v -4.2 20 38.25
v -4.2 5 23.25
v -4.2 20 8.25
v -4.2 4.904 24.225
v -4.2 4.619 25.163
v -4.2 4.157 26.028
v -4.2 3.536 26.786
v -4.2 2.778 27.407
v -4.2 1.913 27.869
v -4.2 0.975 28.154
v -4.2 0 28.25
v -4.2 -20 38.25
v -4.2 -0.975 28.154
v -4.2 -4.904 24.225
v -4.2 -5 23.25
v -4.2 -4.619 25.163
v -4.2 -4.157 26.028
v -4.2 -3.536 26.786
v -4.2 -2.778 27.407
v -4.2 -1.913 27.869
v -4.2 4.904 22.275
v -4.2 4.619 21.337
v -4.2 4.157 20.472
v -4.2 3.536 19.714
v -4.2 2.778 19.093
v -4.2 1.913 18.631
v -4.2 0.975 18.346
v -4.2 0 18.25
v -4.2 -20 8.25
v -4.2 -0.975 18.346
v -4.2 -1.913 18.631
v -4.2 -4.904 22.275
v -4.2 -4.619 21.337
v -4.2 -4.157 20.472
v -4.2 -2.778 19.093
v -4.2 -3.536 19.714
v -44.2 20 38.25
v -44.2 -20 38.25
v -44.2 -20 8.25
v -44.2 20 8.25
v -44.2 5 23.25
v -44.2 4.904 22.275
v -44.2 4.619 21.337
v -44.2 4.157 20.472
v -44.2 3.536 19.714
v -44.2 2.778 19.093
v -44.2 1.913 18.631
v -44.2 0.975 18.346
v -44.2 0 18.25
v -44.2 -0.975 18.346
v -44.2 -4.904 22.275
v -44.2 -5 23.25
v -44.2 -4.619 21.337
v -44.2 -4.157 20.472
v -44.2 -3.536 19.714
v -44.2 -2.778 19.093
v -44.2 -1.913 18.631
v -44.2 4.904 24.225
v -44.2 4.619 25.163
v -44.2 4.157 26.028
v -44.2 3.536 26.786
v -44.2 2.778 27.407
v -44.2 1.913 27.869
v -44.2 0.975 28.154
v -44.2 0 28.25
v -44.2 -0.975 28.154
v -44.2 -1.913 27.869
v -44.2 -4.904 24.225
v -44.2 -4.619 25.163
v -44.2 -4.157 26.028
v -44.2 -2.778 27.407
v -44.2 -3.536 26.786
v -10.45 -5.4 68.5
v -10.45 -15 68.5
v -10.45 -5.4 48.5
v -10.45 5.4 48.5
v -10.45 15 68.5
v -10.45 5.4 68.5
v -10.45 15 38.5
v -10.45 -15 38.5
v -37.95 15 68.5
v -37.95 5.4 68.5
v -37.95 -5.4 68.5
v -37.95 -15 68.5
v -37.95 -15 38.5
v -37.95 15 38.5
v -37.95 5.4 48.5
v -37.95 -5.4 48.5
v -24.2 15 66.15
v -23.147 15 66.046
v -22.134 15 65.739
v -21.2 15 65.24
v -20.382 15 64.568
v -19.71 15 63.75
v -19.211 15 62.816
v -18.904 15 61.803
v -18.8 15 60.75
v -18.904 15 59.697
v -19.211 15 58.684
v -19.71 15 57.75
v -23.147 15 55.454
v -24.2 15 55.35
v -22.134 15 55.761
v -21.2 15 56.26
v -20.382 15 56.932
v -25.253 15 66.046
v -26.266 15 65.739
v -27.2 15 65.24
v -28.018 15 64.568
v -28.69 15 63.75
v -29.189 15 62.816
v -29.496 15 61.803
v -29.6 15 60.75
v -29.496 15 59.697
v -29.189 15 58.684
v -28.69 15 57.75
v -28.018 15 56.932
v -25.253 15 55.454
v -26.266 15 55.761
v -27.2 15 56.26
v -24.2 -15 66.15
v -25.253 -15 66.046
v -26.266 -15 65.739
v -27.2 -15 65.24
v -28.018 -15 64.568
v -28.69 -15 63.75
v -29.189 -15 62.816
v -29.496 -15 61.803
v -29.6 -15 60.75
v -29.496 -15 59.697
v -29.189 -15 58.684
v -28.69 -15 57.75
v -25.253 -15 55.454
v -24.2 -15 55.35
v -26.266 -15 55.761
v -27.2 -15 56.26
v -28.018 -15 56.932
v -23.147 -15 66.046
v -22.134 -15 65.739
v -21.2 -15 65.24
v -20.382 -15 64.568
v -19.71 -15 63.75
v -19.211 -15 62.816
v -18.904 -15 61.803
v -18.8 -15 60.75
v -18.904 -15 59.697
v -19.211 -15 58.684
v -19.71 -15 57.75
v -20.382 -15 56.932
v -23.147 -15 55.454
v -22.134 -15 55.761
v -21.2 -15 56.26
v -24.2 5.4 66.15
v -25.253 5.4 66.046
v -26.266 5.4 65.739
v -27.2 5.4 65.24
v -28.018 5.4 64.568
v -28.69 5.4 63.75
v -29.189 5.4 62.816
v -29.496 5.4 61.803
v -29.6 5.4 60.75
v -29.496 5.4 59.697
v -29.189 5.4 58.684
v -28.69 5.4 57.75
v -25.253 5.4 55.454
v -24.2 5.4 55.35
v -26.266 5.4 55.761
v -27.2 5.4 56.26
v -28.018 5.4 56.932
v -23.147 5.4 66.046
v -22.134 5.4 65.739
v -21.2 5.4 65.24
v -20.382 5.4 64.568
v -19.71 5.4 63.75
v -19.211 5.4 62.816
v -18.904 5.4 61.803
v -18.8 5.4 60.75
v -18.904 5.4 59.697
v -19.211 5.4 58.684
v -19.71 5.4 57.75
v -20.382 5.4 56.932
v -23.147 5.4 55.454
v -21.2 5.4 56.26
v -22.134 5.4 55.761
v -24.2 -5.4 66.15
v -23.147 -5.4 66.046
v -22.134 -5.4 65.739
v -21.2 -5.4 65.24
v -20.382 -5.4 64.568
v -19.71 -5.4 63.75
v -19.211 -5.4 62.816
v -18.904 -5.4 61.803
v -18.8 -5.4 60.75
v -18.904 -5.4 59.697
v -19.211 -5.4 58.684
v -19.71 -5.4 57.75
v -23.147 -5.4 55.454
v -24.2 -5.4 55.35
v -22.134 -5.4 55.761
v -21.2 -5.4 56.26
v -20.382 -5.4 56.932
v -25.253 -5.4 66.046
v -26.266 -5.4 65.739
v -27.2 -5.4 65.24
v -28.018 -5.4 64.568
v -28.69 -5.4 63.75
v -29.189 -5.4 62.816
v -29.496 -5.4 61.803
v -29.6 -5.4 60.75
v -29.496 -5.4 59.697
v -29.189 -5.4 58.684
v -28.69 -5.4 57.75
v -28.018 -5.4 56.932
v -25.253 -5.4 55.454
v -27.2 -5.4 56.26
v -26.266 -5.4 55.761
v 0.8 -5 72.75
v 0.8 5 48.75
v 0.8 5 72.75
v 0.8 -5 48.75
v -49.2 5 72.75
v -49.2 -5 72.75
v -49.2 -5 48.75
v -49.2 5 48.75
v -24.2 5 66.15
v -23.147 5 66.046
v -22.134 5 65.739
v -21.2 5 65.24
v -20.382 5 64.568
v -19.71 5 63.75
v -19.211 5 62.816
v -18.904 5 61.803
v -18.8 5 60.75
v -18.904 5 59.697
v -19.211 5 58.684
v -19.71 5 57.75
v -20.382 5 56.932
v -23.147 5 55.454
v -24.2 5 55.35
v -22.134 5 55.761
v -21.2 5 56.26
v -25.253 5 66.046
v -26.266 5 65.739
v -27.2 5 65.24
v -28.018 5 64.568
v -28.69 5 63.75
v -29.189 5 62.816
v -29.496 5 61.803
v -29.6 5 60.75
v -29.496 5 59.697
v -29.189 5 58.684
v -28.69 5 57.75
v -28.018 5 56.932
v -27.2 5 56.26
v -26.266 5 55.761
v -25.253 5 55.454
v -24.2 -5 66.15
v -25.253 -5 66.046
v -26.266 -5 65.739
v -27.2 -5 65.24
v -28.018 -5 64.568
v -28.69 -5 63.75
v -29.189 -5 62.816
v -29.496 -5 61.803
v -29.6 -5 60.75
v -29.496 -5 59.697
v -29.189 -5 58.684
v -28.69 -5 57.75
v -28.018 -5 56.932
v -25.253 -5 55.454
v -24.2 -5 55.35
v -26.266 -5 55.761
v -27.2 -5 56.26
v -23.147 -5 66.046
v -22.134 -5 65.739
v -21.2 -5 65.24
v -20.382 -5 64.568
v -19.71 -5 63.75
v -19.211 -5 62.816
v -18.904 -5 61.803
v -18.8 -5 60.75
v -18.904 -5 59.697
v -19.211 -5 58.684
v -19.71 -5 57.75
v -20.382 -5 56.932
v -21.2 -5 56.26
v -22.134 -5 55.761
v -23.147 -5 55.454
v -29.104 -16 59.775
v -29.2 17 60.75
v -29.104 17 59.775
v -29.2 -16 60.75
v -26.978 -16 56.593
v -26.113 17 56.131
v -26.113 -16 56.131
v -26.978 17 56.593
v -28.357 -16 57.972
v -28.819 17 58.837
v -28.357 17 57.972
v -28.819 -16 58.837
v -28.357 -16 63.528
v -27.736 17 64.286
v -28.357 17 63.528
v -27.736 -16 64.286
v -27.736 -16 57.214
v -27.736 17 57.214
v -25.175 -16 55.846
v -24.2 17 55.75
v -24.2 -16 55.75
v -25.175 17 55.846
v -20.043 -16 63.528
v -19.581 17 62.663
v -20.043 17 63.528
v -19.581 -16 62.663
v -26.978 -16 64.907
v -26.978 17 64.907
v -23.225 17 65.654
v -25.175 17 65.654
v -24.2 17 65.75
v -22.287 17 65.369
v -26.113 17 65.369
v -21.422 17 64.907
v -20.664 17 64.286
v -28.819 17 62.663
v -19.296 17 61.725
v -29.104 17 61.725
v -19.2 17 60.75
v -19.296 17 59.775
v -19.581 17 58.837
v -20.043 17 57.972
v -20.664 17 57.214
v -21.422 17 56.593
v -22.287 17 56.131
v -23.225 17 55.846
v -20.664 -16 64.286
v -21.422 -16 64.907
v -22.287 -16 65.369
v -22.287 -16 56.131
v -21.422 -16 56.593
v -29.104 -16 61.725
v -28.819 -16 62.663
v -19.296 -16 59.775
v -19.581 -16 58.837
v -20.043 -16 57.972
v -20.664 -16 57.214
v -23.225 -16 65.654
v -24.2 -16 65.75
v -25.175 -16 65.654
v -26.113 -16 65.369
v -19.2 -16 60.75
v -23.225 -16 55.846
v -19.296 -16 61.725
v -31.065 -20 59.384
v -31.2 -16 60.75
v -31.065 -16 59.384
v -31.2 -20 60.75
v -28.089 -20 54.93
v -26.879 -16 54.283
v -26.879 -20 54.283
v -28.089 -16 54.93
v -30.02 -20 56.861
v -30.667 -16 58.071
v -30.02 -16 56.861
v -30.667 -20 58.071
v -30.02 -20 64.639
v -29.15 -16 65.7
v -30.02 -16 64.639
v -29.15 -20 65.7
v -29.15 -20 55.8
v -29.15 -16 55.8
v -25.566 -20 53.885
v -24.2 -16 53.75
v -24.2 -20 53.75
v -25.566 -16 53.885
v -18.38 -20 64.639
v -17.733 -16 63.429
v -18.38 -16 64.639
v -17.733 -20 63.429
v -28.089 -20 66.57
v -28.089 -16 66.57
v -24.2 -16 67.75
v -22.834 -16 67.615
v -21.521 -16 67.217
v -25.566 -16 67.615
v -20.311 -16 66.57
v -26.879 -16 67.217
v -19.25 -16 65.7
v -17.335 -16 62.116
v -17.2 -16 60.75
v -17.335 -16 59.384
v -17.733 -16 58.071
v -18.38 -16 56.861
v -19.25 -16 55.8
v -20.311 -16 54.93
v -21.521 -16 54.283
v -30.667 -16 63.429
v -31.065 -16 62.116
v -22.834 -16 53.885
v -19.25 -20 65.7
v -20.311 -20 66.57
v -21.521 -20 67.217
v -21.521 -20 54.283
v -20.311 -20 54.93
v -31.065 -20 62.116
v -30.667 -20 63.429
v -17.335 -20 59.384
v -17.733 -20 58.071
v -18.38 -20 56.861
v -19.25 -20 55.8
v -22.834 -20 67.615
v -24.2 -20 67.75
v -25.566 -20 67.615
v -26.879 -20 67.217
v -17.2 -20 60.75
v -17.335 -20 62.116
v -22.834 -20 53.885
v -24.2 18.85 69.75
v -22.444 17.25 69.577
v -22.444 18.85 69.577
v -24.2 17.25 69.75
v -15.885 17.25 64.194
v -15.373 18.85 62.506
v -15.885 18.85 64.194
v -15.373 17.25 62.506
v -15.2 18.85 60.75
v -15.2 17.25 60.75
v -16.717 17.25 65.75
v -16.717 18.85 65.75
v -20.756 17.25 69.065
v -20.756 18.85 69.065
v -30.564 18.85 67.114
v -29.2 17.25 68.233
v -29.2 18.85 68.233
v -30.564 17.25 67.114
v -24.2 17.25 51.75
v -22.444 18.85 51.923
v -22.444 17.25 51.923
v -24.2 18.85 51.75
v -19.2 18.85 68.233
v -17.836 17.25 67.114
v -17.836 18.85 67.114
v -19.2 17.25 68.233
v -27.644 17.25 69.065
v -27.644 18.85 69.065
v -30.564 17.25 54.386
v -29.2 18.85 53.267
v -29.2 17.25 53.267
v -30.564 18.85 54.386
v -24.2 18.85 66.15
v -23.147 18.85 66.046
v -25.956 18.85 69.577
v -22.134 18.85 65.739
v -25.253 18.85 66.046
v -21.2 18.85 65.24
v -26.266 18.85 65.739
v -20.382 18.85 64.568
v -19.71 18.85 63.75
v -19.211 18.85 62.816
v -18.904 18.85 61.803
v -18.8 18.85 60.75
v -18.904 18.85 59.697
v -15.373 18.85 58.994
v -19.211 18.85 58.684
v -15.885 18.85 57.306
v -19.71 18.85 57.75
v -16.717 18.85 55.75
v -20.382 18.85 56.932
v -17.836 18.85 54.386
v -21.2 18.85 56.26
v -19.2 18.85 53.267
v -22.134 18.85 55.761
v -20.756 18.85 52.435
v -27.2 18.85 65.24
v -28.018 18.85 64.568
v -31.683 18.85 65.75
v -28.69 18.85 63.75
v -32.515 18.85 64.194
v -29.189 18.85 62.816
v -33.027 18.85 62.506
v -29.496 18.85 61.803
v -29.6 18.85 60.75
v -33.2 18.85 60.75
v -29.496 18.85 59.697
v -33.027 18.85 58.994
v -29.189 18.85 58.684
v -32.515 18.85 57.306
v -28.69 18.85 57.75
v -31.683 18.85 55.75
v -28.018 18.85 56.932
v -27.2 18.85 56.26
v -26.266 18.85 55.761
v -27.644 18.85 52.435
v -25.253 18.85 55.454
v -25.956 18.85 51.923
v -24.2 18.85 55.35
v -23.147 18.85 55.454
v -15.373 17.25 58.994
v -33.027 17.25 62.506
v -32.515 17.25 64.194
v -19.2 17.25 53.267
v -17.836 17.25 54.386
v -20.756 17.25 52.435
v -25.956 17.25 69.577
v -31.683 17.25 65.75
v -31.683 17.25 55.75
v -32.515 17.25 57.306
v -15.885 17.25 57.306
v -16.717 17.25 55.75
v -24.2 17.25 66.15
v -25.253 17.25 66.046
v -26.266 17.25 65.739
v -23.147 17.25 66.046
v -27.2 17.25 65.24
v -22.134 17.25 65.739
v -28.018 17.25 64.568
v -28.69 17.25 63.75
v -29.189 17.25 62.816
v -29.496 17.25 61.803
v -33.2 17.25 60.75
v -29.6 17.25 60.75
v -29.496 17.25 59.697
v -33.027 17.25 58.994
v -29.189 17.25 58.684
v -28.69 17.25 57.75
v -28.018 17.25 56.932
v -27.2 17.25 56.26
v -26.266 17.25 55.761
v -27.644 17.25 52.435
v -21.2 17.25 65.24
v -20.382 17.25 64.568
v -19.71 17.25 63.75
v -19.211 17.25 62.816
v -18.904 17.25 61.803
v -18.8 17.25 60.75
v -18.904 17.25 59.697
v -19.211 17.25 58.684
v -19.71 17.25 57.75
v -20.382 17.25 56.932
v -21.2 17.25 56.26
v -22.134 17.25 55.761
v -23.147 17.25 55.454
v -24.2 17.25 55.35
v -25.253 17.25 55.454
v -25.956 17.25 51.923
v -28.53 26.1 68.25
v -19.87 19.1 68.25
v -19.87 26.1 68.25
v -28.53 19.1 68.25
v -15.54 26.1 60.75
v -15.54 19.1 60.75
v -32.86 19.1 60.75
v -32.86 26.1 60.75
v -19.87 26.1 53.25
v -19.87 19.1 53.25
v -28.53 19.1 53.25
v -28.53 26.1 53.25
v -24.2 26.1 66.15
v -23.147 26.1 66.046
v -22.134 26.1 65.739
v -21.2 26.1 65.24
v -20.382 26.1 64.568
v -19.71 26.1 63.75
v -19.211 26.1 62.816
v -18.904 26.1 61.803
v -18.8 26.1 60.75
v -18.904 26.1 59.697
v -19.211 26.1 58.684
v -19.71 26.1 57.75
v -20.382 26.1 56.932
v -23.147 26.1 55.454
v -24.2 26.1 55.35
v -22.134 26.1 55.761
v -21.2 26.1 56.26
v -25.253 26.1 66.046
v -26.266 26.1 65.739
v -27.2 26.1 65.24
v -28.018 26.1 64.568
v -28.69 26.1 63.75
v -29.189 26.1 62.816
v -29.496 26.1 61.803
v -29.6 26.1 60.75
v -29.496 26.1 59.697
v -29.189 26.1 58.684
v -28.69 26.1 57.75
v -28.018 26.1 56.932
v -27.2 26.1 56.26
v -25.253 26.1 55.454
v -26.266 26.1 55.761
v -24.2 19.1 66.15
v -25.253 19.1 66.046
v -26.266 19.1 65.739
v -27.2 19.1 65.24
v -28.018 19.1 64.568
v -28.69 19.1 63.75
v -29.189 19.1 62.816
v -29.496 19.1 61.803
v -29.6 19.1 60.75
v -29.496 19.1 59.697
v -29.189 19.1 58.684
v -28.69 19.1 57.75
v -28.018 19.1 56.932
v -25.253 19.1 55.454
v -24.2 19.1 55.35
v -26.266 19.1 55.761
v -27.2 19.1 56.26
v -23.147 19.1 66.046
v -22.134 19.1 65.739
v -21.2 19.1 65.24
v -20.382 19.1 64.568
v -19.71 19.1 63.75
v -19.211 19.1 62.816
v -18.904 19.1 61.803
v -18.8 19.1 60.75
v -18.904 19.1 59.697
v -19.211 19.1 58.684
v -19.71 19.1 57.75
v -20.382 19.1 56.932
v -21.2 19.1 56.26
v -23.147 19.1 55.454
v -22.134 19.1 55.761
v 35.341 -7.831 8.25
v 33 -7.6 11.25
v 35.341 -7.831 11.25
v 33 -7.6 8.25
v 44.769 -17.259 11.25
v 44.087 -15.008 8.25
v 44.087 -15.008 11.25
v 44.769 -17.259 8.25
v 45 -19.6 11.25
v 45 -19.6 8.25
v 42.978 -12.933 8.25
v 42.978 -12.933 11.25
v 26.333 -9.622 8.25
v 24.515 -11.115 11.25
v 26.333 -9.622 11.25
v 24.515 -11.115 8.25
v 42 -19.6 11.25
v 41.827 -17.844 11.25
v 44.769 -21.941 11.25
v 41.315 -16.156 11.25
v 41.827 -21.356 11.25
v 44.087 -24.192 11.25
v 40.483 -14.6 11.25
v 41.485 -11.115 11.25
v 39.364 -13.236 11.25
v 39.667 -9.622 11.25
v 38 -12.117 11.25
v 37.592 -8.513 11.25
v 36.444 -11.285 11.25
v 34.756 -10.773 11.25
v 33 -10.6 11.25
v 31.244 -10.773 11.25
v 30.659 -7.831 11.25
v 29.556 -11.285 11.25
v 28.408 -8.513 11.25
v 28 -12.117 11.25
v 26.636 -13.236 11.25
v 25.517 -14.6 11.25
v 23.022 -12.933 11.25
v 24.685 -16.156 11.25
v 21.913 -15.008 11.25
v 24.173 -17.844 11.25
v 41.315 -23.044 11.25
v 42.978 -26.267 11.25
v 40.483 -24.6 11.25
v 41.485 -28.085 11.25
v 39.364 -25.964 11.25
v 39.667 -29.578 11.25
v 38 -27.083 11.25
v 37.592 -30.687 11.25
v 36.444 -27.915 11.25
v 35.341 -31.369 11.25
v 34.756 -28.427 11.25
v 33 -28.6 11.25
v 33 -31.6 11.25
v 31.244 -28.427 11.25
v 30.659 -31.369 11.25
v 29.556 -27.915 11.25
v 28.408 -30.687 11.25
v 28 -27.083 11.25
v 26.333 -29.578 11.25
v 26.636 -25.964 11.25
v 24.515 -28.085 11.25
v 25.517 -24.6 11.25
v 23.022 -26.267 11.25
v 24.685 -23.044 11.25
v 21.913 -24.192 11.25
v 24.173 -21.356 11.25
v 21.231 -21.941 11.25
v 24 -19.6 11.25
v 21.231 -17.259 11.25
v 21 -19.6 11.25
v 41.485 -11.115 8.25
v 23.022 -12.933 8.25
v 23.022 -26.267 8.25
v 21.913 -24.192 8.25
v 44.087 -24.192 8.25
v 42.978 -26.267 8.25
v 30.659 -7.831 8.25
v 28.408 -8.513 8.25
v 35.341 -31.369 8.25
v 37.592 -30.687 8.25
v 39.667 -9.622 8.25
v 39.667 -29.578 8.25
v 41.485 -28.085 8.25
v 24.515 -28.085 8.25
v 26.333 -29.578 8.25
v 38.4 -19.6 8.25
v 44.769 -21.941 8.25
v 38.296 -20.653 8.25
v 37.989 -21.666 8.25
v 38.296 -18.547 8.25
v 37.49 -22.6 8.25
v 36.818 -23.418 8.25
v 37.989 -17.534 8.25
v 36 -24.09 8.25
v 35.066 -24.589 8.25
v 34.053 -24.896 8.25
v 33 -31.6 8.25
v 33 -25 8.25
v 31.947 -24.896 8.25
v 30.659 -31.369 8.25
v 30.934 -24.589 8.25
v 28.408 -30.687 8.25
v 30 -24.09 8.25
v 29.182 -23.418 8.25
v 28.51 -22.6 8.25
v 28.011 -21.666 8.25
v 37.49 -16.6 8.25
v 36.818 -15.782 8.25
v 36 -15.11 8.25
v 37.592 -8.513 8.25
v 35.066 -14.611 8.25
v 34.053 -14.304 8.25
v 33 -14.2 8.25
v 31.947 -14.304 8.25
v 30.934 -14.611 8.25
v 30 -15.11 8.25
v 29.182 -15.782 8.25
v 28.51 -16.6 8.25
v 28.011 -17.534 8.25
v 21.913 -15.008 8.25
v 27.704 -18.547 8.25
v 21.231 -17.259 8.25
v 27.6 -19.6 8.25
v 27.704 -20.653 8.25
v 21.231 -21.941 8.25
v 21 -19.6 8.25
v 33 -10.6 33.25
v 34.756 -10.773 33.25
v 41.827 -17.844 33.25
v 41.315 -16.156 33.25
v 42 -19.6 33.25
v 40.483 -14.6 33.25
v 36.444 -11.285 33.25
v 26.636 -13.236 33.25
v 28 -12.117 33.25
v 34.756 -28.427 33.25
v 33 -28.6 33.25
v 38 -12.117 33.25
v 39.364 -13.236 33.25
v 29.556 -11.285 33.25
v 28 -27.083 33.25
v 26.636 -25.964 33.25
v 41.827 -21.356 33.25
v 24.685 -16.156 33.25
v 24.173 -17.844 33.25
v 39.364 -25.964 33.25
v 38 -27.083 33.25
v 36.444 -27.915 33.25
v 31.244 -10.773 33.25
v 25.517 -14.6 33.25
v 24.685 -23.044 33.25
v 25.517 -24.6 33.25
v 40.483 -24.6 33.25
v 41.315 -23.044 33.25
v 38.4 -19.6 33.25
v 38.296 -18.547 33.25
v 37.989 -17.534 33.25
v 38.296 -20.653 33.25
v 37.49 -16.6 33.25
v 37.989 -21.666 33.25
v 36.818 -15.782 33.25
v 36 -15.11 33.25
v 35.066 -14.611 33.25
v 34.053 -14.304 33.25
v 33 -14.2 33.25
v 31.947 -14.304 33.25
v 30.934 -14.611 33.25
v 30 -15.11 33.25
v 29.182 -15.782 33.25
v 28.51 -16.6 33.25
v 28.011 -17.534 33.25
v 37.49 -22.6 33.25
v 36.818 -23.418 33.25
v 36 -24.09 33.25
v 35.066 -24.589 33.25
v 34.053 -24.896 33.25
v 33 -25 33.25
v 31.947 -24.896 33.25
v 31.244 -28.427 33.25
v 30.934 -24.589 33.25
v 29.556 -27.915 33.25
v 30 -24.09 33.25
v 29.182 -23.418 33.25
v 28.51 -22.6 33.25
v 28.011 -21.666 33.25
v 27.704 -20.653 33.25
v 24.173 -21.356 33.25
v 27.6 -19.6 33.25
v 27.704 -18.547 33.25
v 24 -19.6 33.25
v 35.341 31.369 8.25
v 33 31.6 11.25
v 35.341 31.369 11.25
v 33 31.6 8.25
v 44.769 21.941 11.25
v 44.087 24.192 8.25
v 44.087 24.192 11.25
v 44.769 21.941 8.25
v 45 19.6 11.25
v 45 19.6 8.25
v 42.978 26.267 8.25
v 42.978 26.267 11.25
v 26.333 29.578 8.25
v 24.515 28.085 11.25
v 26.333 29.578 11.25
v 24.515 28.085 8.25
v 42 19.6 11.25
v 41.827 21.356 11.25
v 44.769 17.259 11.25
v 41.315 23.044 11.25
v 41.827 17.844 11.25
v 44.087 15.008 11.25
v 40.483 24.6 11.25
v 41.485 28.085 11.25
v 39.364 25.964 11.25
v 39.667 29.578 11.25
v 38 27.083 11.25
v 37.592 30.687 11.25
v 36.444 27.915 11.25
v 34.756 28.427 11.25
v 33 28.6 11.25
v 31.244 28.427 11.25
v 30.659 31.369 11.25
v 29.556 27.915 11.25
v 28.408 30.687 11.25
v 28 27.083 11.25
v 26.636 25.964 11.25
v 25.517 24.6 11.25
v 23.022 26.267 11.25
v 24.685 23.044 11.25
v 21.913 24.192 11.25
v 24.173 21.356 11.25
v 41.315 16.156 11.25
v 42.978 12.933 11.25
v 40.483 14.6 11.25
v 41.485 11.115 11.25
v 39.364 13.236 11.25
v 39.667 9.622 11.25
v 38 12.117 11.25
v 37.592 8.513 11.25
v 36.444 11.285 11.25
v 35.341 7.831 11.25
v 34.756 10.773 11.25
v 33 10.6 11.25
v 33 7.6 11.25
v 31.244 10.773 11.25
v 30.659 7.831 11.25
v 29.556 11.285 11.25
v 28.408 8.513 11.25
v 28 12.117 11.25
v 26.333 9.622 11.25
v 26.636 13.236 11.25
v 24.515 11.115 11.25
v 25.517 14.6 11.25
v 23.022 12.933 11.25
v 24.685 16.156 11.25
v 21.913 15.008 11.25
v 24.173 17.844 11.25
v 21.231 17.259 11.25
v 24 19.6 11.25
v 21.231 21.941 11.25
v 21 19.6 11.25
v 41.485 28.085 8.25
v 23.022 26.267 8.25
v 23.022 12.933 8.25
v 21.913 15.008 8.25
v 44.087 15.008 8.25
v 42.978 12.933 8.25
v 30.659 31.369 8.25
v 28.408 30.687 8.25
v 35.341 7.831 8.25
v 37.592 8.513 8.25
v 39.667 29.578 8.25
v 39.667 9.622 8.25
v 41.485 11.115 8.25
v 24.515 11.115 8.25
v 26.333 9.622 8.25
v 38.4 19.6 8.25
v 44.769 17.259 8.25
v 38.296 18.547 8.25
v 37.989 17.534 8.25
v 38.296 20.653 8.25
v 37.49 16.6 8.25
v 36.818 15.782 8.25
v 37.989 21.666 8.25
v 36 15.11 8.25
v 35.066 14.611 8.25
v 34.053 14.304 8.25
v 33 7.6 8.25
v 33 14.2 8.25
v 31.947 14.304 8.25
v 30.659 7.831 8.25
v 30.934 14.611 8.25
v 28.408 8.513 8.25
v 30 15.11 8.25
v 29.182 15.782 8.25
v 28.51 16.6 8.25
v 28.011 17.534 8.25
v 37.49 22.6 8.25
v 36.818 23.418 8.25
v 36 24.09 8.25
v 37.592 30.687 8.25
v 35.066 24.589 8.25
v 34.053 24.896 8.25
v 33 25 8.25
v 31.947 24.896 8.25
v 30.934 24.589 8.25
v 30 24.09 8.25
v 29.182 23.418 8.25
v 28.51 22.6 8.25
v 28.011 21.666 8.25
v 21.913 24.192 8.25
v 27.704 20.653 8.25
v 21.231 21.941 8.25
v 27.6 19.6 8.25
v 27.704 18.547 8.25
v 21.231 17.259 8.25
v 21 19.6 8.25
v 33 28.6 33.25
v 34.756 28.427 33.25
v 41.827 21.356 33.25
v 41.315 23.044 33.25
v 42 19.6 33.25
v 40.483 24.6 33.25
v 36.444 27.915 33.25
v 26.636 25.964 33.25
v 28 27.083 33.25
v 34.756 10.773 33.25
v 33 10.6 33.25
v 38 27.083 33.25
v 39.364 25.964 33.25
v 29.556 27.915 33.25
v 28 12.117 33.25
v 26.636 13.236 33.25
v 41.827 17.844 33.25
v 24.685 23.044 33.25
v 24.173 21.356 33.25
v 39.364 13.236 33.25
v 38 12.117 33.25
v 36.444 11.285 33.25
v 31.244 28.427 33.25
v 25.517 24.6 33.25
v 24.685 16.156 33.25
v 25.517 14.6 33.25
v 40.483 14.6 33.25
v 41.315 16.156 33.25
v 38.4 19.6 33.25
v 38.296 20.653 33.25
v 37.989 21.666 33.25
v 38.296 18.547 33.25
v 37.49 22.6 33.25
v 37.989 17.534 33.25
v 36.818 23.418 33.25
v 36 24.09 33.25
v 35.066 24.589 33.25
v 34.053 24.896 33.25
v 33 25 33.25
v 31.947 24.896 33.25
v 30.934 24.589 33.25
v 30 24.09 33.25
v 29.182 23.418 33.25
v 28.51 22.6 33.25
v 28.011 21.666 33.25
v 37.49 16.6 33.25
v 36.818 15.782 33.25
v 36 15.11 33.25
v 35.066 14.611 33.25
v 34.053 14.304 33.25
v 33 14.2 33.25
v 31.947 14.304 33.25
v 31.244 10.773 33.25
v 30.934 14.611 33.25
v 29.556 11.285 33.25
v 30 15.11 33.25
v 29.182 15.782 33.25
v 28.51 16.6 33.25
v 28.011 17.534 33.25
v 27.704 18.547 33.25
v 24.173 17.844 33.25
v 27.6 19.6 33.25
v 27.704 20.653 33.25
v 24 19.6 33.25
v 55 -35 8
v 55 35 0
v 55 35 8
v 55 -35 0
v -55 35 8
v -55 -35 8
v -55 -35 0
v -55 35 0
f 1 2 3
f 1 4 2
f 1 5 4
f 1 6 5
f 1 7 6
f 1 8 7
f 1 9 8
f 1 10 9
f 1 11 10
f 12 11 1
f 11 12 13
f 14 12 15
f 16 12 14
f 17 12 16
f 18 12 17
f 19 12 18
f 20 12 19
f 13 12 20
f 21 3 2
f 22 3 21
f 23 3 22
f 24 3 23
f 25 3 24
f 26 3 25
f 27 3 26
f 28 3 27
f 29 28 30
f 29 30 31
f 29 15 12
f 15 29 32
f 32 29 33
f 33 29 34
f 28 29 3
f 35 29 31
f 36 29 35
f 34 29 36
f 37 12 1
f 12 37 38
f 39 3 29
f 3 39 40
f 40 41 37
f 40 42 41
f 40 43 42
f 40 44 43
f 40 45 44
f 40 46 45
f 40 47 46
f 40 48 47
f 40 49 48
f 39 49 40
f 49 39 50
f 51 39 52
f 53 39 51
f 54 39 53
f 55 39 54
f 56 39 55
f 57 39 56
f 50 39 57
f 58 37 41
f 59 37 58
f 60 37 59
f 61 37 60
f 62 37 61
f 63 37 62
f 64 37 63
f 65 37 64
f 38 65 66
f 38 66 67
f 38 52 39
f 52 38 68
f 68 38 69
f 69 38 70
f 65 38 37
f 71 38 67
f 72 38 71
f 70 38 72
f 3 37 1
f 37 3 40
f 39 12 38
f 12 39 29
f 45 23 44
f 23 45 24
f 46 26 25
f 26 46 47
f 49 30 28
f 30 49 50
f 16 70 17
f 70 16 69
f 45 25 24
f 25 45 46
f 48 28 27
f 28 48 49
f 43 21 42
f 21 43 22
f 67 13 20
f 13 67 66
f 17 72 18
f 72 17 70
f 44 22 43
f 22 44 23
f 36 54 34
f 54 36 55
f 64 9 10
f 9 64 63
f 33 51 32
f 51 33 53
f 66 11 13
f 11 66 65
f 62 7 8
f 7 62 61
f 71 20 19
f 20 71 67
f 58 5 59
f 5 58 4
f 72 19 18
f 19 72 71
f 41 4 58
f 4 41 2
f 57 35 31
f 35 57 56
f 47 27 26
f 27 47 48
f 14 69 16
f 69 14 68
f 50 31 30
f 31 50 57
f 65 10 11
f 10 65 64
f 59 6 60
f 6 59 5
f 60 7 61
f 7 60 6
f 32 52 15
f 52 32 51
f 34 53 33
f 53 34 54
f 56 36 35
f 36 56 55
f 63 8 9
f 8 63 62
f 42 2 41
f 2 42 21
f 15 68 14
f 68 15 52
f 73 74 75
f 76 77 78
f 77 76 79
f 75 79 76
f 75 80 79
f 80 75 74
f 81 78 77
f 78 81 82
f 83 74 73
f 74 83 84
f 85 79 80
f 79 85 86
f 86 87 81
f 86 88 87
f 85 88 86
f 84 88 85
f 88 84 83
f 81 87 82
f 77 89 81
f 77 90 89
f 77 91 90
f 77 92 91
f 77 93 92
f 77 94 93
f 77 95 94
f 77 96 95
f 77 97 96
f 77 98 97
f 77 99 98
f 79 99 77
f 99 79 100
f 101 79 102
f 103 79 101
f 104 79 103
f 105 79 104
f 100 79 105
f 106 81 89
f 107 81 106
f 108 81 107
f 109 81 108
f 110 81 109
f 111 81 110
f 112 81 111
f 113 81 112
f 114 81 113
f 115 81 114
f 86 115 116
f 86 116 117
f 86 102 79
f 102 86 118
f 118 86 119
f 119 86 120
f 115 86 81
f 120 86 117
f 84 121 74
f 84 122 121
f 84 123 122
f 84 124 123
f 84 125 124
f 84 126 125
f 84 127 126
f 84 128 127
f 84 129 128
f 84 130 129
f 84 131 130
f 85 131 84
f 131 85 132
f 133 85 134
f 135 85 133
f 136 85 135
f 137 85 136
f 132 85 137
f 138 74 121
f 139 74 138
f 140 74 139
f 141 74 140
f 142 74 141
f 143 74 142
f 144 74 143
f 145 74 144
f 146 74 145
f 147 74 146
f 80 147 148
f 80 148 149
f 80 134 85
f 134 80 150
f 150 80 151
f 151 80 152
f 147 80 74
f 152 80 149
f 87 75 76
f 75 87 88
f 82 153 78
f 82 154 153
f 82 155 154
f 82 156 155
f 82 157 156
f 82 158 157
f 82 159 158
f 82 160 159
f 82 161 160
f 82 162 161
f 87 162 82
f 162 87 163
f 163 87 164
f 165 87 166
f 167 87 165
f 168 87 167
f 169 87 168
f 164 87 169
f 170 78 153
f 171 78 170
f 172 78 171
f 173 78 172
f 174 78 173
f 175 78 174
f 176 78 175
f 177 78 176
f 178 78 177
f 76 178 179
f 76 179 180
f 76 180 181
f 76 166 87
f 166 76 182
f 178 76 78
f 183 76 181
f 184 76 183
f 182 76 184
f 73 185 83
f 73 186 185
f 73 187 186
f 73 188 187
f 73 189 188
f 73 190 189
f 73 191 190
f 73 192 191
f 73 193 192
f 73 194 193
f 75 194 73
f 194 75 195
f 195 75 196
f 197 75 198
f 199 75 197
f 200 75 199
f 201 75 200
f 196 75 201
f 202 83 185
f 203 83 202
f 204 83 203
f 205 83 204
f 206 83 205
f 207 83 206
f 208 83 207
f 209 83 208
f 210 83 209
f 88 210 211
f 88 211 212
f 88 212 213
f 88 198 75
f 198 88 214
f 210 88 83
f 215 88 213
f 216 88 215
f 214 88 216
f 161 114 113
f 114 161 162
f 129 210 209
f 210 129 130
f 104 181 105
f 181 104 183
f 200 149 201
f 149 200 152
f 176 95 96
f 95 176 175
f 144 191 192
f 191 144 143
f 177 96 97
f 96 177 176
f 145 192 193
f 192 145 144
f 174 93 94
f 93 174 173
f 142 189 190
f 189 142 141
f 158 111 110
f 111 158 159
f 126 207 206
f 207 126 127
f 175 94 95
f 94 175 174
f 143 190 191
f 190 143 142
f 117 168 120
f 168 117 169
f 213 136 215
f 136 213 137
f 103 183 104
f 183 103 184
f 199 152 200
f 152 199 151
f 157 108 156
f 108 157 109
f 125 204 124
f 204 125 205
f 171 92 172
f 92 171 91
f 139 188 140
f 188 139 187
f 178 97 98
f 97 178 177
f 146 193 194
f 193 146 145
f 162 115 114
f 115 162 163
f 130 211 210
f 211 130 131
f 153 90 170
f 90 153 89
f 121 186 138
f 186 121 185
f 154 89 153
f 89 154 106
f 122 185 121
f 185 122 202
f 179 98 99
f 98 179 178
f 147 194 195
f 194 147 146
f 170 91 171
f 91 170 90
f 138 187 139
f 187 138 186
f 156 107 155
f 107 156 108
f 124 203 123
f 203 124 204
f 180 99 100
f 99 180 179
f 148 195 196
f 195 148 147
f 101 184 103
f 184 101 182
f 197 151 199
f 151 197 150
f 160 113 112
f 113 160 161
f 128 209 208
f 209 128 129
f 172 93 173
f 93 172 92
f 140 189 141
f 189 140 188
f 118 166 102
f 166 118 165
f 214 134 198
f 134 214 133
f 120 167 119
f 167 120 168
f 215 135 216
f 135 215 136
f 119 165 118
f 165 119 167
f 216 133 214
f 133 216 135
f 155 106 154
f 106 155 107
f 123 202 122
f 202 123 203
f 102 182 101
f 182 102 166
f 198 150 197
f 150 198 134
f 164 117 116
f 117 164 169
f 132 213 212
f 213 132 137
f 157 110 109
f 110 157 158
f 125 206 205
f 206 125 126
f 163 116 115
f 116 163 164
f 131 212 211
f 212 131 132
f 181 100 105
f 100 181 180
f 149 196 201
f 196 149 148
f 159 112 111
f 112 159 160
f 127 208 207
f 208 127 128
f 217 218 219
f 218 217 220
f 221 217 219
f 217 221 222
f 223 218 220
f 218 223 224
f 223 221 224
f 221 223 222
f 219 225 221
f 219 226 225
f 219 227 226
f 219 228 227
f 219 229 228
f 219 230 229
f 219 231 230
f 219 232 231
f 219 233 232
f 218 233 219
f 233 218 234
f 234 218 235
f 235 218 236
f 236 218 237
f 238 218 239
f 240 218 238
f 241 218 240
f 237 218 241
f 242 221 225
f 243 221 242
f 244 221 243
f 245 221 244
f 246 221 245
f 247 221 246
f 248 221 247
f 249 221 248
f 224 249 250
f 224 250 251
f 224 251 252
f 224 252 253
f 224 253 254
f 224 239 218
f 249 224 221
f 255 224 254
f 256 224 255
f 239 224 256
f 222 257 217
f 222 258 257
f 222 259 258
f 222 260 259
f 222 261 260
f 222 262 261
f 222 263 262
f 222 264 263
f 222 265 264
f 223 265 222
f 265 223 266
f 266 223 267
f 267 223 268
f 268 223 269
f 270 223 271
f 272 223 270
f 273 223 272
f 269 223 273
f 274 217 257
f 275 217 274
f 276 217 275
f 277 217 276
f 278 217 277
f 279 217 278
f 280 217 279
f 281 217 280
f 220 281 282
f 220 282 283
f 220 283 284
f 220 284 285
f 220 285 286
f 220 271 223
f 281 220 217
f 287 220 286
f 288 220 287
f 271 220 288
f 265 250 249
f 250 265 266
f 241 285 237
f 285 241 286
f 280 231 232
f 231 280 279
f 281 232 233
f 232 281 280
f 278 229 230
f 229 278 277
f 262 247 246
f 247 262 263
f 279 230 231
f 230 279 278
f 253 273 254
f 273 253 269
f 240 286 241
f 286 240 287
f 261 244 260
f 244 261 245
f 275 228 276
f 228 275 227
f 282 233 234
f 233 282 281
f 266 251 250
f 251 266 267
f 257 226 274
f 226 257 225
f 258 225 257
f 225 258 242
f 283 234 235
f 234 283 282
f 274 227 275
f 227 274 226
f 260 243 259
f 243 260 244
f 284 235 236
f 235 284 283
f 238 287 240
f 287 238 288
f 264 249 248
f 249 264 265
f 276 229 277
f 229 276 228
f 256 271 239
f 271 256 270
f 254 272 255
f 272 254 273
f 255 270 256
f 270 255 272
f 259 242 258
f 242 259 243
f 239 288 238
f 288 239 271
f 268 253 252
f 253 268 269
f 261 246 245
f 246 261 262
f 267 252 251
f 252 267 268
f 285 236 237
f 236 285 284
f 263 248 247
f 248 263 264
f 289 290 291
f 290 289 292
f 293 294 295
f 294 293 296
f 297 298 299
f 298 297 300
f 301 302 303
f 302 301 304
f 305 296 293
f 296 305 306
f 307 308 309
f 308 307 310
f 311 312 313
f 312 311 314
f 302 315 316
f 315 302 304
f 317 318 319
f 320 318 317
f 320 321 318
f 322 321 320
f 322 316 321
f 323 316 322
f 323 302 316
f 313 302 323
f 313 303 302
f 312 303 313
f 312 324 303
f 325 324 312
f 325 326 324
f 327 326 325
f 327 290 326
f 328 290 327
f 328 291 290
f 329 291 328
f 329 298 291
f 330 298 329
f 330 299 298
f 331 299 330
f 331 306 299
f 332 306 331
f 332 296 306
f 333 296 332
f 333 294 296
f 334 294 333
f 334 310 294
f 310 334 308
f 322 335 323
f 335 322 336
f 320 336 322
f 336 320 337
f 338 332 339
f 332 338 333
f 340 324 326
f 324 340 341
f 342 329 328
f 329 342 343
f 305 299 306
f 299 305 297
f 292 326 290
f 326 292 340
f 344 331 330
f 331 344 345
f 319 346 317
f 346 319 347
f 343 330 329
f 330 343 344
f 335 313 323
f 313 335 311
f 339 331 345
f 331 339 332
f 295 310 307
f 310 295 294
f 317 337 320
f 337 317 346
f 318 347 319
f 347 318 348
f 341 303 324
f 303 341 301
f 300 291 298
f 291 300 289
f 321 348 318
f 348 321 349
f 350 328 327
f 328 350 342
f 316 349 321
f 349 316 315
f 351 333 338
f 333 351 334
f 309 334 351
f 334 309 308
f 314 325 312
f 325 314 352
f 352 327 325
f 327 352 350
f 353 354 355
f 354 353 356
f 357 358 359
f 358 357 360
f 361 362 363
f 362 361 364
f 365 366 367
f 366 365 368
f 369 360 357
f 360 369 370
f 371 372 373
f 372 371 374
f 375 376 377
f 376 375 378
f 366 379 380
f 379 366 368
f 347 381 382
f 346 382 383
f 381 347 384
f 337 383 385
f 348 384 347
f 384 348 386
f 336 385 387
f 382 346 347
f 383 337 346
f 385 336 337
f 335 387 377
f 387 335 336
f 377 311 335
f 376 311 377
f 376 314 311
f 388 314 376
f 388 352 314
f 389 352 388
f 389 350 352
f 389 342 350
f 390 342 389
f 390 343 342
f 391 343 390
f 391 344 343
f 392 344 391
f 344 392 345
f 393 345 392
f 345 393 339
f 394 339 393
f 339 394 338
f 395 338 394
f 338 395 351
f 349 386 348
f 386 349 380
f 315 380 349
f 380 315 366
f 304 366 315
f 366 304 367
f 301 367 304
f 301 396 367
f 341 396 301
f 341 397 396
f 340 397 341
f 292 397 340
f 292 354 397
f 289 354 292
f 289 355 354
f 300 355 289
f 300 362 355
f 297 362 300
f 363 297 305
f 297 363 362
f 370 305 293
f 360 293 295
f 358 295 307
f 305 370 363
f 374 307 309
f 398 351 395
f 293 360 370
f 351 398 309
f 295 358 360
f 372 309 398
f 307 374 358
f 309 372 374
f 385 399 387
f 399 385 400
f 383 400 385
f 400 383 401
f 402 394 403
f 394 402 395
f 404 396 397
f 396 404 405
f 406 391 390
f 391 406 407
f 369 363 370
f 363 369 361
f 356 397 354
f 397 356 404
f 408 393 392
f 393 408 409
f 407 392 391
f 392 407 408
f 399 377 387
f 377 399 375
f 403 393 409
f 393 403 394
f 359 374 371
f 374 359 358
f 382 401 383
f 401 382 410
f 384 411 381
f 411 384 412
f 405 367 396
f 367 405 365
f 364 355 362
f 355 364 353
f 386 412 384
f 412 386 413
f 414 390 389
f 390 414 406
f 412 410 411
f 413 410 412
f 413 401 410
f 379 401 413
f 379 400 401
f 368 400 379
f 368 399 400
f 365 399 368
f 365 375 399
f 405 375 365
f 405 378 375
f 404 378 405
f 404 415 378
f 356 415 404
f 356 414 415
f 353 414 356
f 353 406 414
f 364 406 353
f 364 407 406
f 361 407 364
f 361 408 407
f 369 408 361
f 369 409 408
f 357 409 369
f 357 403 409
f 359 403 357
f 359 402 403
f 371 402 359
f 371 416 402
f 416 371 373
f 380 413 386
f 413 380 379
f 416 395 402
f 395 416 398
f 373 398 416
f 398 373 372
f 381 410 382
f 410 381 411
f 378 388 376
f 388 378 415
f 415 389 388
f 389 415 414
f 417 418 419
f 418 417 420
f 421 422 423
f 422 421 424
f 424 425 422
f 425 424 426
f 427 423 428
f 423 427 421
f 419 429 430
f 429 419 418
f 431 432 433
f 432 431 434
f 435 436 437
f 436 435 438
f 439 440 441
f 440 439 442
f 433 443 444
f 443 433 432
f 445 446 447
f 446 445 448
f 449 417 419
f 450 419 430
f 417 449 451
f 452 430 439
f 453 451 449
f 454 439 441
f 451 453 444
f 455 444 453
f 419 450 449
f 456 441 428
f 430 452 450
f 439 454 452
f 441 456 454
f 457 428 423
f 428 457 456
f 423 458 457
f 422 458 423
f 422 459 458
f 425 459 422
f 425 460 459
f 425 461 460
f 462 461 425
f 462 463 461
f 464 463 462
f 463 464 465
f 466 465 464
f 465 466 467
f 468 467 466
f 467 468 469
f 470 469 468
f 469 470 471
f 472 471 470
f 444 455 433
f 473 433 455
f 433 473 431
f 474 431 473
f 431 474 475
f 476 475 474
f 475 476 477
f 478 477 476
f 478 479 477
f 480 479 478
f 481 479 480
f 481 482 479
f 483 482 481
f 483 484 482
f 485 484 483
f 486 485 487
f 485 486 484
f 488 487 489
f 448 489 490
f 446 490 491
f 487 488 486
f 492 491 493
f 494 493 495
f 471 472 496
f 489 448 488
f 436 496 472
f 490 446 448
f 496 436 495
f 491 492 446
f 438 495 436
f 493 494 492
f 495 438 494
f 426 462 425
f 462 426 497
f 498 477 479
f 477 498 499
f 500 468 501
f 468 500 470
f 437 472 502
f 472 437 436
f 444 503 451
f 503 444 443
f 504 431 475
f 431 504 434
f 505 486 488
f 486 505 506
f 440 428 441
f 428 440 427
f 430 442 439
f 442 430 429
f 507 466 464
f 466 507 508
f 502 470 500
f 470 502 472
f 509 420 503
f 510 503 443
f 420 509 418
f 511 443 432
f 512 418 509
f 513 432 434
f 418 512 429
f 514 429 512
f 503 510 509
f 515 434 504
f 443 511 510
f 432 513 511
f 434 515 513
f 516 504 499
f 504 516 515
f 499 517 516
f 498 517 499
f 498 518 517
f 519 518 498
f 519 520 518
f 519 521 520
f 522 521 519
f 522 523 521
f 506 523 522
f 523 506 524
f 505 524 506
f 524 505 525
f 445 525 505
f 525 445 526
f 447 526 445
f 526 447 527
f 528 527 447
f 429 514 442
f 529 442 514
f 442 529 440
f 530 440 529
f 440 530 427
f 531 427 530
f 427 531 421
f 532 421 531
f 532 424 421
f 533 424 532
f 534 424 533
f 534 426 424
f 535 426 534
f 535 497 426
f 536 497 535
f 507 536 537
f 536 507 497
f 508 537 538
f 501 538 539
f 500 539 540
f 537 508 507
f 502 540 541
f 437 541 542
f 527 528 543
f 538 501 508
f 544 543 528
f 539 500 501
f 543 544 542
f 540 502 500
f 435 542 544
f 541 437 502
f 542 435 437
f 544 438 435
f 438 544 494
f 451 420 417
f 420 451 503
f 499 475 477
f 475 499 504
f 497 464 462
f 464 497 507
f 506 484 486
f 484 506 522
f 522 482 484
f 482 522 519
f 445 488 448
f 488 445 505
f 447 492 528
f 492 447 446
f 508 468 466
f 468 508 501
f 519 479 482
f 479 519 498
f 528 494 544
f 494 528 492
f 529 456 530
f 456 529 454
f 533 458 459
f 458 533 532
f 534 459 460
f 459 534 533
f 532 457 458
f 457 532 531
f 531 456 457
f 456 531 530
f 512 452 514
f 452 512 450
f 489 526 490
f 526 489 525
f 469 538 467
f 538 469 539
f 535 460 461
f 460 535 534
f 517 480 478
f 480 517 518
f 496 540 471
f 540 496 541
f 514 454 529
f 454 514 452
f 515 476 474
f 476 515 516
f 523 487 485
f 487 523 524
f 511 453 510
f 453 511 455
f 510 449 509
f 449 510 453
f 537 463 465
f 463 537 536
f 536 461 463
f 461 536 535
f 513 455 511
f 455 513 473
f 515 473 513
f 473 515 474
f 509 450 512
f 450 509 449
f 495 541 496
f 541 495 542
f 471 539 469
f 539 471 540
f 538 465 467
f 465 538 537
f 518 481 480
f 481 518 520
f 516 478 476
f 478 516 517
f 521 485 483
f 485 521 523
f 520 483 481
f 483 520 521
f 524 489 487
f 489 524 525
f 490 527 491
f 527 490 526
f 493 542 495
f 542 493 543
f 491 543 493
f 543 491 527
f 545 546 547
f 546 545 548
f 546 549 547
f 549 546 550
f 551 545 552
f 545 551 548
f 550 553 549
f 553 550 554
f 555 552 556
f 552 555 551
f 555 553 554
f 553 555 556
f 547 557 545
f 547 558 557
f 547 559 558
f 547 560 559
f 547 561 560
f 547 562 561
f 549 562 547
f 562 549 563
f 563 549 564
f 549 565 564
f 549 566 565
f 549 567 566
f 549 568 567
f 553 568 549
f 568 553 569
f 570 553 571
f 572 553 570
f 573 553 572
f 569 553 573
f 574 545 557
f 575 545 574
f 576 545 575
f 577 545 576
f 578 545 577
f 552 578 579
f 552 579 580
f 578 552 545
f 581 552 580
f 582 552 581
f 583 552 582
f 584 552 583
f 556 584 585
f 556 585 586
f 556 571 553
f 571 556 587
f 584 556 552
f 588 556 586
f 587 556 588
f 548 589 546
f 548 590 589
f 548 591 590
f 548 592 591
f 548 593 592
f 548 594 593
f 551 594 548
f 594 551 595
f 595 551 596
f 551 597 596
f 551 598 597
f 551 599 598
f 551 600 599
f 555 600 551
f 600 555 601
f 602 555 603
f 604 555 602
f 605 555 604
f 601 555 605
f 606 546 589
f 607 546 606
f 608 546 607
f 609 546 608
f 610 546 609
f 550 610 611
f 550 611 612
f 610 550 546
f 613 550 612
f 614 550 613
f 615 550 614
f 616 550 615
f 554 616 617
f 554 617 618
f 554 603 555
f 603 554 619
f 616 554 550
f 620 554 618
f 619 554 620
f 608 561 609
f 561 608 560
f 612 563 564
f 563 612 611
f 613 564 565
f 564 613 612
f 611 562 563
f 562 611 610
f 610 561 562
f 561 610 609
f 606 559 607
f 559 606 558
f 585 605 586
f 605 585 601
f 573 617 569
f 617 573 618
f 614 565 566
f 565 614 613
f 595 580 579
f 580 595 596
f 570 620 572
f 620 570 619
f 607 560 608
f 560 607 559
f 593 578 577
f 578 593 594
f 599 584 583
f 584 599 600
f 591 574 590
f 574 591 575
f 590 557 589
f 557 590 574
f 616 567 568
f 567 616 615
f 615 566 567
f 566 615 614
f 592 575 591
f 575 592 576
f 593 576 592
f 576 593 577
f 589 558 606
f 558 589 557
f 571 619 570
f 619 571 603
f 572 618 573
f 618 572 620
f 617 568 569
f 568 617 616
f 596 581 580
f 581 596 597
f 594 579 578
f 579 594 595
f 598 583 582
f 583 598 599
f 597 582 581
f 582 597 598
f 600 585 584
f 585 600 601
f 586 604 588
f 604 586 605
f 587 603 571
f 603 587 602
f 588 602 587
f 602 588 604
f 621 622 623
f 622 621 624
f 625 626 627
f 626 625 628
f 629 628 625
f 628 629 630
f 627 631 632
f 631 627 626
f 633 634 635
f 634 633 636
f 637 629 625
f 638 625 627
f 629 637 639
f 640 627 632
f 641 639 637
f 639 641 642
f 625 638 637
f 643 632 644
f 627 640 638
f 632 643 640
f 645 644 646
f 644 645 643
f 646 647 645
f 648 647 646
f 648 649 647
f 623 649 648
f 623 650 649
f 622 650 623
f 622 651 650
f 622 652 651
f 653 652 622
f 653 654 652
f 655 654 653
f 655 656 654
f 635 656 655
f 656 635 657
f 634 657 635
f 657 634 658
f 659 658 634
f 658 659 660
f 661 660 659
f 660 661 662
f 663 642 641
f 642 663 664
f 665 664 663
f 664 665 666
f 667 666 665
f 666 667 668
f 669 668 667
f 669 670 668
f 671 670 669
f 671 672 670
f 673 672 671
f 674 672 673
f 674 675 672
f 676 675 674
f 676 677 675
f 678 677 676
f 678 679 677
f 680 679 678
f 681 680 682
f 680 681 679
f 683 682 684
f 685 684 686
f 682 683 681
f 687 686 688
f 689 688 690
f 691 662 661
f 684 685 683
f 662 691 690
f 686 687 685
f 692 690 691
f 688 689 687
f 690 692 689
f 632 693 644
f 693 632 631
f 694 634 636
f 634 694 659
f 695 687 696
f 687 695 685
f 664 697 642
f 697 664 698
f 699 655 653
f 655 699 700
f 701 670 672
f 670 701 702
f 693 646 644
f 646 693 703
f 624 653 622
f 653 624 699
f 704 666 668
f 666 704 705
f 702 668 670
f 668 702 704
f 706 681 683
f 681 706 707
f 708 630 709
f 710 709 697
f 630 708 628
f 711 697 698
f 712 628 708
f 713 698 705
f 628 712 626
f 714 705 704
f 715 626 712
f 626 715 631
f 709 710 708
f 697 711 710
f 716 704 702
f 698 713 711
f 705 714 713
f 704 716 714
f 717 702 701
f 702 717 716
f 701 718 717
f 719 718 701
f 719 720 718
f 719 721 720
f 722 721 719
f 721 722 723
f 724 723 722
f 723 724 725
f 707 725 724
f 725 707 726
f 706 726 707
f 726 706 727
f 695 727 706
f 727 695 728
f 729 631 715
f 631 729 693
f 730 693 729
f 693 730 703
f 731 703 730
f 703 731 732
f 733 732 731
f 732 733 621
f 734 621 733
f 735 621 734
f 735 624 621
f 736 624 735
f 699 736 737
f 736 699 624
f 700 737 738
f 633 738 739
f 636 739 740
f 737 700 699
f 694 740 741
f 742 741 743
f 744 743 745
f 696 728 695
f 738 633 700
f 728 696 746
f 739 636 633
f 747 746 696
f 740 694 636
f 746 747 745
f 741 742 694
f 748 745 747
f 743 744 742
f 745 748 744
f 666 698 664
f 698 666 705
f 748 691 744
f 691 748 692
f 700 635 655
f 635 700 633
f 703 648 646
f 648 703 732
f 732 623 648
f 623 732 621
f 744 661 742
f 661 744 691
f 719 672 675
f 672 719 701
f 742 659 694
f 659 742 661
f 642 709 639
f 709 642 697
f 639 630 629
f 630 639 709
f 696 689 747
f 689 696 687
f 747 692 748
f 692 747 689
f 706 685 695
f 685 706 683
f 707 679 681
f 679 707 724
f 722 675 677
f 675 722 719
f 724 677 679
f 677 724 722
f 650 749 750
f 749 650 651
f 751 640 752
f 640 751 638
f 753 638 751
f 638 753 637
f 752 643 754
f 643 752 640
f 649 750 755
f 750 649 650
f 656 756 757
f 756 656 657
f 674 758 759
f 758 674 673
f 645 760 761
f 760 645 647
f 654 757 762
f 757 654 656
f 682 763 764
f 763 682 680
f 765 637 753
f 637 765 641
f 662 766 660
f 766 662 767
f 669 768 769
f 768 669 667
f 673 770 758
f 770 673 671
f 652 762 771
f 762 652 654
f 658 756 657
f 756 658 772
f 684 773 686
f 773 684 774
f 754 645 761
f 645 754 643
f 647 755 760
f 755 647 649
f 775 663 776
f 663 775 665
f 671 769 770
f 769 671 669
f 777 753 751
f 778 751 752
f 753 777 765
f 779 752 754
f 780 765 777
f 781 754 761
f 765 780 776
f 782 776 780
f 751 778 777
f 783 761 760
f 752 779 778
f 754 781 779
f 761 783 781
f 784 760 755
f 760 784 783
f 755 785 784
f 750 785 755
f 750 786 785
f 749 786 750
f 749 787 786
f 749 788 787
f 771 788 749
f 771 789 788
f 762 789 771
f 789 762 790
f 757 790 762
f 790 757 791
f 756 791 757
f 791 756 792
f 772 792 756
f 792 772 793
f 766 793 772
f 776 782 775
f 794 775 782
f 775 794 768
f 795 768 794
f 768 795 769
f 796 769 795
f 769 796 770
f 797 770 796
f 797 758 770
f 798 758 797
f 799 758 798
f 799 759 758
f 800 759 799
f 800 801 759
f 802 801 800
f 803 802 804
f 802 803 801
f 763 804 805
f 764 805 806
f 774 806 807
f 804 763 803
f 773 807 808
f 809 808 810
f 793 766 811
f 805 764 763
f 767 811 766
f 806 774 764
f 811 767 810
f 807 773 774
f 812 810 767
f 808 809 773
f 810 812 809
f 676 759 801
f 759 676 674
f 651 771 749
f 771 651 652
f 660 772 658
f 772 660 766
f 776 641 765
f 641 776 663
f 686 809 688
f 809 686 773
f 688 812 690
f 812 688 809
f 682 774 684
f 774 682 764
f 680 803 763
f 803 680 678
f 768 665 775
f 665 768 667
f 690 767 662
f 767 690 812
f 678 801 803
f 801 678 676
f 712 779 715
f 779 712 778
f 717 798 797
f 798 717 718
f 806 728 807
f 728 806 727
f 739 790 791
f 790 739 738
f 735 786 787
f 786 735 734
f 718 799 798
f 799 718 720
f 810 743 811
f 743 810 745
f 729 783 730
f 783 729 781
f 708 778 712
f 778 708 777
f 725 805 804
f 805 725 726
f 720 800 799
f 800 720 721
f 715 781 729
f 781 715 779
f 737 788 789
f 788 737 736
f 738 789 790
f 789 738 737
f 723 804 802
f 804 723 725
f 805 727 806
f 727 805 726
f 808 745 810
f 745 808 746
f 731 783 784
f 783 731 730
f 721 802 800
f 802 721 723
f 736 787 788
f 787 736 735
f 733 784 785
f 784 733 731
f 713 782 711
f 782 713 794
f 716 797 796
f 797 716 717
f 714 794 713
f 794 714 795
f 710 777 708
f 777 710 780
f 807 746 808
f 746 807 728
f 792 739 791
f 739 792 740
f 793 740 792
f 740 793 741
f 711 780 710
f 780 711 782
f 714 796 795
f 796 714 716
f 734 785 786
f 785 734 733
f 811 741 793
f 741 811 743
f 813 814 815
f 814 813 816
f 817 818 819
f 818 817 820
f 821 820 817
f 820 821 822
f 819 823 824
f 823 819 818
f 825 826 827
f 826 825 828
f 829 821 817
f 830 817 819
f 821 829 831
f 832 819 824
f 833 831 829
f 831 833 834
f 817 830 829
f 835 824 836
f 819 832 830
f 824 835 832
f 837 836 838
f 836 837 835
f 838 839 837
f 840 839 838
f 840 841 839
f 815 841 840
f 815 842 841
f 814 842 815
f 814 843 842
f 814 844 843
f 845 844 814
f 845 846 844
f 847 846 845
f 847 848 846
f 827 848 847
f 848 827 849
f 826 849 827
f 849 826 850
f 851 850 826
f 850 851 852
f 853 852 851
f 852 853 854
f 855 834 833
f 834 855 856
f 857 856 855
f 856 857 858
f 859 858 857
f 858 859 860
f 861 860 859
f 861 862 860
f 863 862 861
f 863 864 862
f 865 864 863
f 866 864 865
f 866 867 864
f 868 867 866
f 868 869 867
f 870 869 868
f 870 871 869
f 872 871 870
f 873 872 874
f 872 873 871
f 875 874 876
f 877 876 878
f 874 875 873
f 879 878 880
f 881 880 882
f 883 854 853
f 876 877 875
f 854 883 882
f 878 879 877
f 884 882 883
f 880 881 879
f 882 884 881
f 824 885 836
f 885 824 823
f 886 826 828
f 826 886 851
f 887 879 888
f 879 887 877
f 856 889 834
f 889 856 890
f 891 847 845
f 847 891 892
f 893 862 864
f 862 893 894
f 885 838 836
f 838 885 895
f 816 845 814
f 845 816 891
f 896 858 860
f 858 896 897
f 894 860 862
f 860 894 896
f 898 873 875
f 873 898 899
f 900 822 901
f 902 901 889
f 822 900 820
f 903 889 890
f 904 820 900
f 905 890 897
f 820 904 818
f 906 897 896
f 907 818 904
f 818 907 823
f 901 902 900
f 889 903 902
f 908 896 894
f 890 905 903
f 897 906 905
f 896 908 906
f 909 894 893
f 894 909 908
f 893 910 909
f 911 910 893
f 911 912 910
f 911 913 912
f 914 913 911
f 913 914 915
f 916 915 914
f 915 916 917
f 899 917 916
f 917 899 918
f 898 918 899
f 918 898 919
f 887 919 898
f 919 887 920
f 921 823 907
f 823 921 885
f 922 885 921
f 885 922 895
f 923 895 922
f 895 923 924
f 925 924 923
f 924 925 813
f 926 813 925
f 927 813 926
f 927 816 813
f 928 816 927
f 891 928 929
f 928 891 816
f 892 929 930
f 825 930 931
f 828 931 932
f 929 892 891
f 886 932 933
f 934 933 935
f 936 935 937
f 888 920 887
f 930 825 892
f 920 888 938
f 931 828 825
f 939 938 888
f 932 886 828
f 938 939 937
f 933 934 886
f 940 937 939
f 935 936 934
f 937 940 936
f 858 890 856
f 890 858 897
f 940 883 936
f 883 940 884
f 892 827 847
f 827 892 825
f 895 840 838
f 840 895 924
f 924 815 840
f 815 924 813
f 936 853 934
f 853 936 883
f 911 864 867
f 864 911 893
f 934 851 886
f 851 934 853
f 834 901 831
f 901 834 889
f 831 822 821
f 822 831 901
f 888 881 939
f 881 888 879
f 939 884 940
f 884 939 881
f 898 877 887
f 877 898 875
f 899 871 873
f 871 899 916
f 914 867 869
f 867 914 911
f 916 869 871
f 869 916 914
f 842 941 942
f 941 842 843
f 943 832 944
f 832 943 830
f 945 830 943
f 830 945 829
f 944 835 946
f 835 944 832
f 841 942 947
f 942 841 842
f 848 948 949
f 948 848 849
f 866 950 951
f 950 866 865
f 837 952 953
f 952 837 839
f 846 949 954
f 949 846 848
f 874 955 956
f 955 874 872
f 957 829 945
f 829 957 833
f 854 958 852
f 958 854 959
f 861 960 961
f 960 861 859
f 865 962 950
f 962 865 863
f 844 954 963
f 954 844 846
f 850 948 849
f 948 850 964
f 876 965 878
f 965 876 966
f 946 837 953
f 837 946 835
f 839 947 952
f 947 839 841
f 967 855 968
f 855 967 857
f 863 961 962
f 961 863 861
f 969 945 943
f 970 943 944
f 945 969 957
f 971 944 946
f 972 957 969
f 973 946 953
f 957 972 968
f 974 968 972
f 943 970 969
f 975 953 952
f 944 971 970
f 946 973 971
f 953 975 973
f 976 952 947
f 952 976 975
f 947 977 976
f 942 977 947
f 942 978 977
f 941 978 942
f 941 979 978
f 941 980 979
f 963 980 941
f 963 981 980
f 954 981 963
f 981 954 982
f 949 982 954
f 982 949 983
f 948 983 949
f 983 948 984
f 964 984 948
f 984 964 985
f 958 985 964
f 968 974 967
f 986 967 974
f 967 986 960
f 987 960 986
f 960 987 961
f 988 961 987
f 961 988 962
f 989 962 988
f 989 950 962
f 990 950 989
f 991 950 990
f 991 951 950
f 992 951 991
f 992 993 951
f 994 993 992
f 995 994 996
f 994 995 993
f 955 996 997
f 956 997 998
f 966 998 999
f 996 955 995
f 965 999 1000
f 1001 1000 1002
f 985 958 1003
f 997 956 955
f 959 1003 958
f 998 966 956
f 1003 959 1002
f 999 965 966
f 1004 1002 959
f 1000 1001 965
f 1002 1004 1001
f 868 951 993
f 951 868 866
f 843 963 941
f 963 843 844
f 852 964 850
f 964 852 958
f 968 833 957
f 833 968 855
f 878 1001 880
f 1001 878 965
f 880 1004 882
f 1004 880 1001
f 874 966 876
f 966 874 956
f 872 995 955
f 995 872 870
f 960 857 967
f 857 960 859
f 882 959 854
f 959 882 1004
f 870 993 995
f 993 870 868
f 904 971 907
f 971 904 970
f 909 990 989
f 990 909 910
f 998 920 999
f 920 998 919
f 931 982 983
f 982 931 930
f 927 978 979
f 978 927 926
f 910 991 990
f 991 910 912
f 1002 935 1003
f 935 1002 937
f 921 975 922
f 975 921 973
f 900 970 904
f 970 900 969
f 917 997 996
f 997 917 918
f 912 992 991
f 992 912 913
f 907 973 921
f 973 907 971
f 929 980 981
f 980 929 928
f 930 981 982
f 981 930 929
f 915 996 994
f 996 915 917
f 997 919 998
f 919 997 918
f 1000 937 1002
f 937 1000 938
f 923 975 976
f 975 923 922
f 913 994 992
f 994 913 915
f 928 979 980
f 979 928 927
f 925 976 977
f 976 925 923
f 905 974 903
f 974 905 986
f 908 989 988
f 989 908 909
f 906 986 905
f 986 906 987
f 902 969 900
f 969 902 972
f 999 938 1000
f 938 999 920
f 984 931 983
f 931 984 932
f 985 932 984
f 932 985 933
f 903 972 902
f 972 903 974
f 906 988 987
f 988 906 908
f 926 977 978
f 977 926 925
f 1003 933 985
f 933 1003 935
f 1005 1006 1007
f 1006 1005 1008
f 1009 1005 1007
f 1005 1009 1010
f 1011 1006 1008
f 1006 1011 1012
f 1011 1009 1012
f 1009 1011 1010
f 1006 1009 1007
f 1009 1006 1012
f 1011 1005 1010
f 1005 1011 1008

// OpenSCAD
$fn = 32;

// ------------------------------------------------------------------------
// Indexing jig: plate 110 x 70 mm, pin d10
// Every part is its own module, assembly() places every instance.
// ------------------------------------------------------------------------

// --- part 1 ---
module jig_plate() {
  difference() {
    translate([-55, -35, 0]) cube([110, 70, 8]);
  }
}

// --- part 2 ---
module locator_block() {
  difference() {
    translate([-20, -20, 0]) cube([40, 40, 30]);
    translate([0, 0, 15]) rotate([0, 90, 0]) cylinder(h = 42, d = 10, center = true);
  }
}

// --- part 3 ---
module index_fork() {
  difference() {
    translate([-13.75, -15, 0]) cube([27.5, 30, 30]);
    translate([-14.75, -5.4, 10]) cube([29.5, 10.8, 21]);
    translate([0, 0, 22.25]) rotate([90, 0, 0]) cylinder(h = 32, d = 10.8, center = true);
  }
}

// --- part 4 ---
module index_arm() {
  difference() {
    translate([-25, -5, 0]) cube([50, 10, 24]);
    translate([0, 0, 12]) rotate([90, 0, 0]) cylinder(h = 12, d = 10.8, center = true);
  }
}

// --- part 5 ---
module index_pin() {
  rotate([0, 90, 0]) cylinder(h = 34, d = 10, center = true);
  translate([-20, 0, 0]) rotate([0, 90, 0]) cylinder(h = 4, d = 14);
}

// --- part 6 ---
module pin_washer() {
  difference() {
      translate([0, 0, 0]) cylinder(h = 1.6, d = 18);
      translate([0, 0, -1]) cylinder(h = 3.6, d = 10.8);
    }
}

// --- part 7 ---
module lock_nut() {
  difference() {
    linear_extrude(height = 7) polygon(points = [[8.66, 0], [4.33, 7.5], [-4.33, 7.5], [-8.66, 0], [-4.33, -7.5], [4.33, -7.5]]);
    translate([0, 0, -1]) cylinder(h = 9, d = 10.8);
  }
}

// --- part 8 ---
module guide_bush_a() {
  difference() {
    union() {
      cylinder(h = 3, d = 24);
      translate([0, 0, 3]) cylinder(h = 22, d = 18);
    }
    translate([0, 0, -1]) cylinder(h = 27, d = 10.8);
  }
}

// --- part 9 ---
module guide_bush_b() {
  difference() {
    union() {
      cylinder(h = 3, d = 24);
      translate([0, 0, 3]) cylinder(h = 22, d = 18);
    }
    translate([0, 0, -1]) cylinder(h = 27, d = 10.8);
  }
}

// --- assembly ---
module assembly() {
  color([0.80, 0.24, 0.20]) translate([0, 0, 0]) rotate([0, 0, 0]) jig_plate();
  color([0.20, 0.45, 0.75]) translate([-24.2, 0, 8.25]) rotate([0, 0, 0]) locator_block();
  color([0.25, 0.62, 0.32]) translate([-24.2, 0, 38.5]) rotate([0, 0, 0]) index_fork();
  color([0.92, 0.70, 0.18]) translate([-24.2, 0, 48.75]) rotate([0, 0, 0]) index_arm();
  color([0.58, 0.35, 0.70]) translate([-24.2, 0, 60.75]) rotate([0, 0, 90]) index_pin();
  color([0.16, 0.66, 0.66]) translate([-24.2, 18.85, 60.75]) rotate([90, 0, 0]) pin_washer();
  color([0.85, 0.48, 0.18]) translate([-24.2, 26.1, 60.75]) rotate([90, 0, 0]) lock_nut();
  color([0.55, 0.60, 0.65]) translate([33, -19.6, 8.25]) rotate([0, 0, 0]) guide_bush_a();
  color([0.75, 0.30, 0.55]) translate([33, 19.6, 8.25]) rotate([0, 0, 0]) guide_bush_b();
}

assembly();
